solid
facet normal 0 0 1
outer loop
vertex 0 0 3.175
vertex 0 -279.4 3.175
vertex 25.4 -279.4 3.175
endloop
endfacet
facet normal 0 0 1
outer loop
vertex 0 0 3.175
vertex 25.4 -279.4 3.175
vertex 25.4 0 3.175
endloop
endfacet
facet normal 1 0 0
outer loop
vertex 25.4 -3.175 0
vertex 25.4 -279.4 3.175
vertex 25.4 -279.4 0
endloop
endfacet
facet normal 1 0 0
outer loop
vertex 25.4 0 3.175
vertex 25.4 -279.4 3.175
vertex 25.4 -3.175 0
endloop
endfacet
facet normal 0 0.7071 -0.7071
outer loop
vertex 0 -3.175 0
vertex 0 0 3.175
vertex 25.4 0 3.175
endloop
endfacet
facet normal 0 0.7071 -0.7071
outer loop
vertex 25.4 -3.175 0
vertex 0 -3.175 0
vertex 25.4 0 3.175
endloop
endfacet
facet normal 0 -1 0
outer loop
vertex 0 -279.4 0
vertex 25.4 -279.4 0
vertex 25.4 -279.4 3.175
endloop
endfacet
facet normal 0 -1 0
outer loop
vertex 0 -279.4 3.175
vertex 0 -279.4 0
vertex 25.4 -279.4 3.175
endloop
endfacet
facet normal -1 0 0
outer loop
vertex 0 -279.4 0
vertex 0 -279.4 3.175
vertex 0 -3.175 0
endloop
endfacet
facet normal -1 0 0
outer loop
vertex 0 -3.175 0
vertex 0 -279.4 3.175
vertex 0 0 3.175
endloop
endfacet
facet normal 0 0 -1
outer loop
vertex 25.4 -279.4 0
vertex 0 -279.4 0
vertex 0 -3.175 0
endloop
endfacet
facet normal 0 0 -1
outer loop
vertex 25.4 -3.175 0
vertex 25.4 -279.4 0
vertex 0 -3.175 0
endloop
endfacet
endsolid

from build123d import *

# Parameters (mm, degrees)
F0_W     = 279.4
F0_H     = 3.175
F1_DEPTH = 25.4
F2_SIZE  = 3.17499


# Not quite as in the source:
# - a fillet or chamfer is up to 0.001 mm smaller than in the source, because OpenCascade refuses the exact size


with BuildPart() as f1:
    # F0 (on Right) → F1 (new body)
    with BuildSketch(Plane.YZ):
        with Locations((-139.7, 1.5875)):
            Rectangle(F0_W, F0_H)
    extrude(amount=F1_DEPTH)

    # F2 (size 3.175 in the source; OpenCascade refuses exactly that, so slightly less here)
    f2_edges = [f1.edges().sort_by_distance(p)[0] for p in [
        (12.7, 0, 0),
    ]]
    chamfer(f2_edges, length=F2_SIZE)


solid = f1.part
